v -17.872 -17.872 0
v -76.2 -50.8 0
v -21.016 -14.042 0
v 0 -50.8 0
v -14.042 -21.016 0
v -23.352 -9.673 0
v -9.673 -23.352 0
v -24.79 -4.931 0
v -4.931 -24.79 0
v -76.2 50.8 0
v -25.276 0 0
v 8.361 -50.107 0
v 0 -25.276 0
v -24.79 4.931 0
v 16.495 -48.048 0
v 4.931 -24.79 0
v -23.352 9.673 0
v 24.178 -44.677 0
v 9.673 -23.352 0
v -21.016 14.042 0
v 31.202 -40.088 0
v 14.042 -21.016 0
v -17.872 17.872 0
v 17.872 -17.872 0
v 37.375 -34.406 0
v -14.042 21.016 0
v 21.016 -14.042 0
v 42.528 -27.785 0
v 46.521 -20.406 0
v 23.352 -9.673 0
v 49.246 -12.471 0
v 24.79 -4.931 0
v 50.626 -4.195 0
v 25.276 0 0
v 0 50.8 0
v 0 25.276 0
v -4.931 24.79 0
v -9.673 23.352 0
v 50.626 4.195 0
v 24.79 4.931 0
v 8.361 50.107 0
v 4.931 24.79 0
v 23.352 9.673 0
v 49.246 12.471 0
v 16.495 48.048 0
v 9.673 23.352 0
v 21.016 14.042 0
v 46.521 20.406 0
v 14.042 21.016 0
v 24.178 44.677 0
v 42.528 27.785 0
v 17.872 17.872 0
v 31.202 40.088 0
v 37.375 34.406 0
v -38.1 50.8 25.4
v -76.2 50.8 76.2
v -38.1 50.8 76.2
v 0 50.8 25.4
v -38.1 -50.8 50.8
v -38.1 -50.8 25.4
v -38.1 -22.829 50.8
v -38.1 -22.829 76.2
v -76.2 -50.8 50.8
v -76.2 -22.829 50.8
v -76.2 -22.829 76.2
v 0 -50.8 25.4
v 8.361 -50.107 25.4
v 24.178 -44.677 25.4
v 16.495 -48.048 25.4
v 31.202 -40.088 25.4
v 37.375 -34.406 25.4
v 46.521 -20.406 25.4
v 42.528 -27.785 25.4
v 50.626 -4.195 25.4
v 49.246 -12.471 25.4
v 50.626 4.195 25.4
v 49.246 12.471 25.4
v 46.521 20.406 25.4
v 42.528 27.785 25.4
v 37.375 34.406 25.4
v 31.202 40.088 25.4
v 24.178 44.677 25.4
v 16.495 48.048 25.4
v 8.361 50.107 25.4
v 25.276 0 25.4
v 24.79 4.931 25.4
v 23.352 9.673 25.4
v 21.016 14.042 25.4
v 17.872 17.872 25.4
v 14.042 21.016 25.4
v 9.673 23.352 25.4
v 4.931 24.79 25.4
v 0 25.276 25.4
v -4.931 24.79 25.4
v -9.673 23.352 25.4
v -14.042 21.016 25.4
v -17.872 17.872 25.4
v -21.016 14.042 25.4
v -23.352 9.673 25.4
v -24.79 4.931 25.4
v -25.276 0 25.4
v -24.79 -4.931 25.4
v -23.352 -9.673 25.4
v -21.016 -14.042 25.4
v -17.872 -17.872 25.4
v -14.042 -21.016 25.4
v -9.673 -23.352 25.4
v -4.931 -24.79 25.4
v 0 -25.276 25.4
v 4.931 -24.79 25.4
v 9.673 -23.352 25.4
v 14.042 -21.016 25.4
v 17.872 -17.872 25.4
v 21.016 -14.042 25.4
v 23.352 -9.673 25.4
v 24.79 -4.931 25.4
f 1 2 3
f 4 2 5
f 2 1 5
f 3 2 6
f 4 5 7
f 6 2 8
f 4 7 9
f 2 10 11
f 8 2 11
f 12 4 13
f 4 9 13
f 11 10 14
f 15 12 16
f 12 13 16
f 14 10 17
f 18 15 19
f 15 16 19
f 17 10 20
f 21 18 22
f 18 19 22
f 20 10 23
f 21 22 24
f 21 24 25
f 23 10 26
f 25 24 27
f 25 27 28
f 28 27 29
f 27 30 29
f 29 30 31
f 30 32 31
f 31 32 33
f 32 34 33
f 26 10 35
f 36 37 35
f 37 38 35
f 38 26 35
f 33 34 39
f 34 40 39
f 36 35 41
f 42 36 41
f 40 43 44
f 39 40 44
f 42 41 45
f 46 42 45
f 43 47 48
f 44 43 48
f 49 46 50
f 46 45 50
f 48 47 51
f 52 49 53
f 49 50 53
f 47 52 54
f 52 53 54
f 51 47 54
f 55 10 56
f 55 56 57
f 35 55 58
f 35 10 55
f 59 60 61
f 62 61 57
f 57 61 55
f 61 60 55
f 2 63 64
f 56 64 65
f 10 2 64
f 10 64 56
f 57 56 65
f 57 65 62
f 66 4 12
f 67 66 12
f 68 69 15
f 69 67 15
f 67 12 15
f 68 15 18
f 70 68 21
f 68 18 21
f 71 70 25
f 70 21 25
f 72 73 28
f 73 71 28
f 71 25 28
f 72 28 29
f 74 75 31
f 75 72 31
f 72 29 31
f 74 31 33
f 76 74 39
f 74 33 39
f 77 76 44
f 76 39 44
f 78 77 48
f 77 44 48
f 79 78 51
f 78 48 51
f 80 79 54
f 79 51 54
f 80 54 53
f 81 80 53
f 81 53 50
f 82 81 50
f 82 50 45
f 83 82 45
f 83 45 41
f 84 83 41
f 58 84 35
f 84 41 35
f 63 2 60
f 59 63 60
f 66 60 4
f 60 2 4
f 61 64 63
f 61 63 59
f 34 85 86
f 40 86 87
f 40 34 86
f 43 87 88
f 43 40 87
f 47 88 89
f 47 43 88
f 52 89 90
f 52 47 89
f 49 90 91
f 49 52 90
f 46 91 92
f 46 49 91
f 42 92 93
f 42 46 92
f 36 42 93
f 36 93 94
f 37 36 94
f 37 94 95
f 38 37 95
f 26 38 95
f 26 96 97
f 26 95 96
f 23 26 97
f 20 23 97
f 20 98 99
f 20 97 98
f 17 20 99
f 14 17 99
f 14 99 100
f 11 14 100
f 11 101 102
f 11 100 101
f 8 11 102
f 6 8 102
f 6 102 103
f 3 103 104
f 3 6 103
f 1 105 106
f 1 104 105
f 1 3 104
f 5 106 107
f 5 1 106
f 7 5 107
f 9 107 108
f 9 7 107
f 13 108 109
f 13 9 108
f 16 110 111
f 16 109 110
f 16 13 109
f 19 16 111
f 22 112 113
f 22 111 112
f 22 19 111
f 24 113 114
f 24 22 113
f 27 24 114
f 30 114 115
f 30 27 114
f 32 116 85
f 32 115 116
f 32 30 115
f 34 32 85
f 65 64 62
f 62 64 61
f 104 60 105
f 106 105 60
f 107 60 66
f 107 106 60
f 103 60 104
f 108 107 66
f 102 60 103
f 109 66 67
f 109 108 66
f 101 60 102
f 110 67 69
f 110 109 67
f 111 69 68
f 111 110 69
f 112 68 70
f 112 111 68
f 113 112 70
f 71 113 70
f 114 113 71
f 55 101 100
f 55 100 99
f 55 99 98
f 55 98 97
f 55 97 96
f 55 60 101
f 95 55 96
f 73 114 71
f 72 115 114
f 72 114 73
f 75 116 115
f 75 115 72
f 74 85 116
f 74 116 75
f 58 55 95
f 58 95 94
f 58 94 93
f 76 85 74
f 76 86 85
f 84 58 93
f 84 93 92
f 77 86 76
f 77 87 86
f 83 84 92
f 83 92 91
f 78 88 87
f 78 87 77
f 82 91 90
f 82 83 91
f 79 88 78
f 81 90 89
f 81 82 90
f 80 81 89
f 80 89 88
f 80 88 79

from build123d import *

# Parameters (mm, degrees)
F0_W     = 76.2
F0_H     = 101.6
F2_DEPTH = 25.4
F1_R     = 50.8
F3_DEPTH = 25.4
F4_R     = 25.275511
F5_DEPTH = 25.401
F6_W     = 38.1
F6_H     = 101.6
F7_DEPTH = 50.8
F8_W     = 38.1
F8_H     = 73.628832
F9_DEPTH = 76.2


with BuildPart() as f2:
    # F0 (on Top) → F2 (new body)
    with BuildSketch(Plane.XY):
        with Locations((-38.1, 0)):
            Rectangle(F0_W, F0_H)
    extrude(amount=F2_DEPTH)

    # F1 (on Top) → F3 (join)
    with BuildSketch(Plane.XY):
        Circle(F1_R)
    extrude(amount=F3_DEPTH)

    # F4 (on Top) → F5 (cut, through all)
    with BuildSketch(Plane.XY):
        Circle(F4_R)
    extrude(amount=F5_DEPTH, mode=Mode.SUBTRACT)

    # F6 (on Top) → F7 (join)
    with BuildSketch(Plane.XY):
        with Locations((-57.15, 0)):
            Rectangle(F6_W, F6_H)
    extrude(amount=F7_DEPTH)

    # F8 (on Top) → F9 (join)
    with BuildSketch(Plane.XY):
        with Locations((-57.15, 13.985584)):
            Rectangle(F8_W, F8_H)
    extrude(amount=F9_DEPTH)


solid = f2.part
